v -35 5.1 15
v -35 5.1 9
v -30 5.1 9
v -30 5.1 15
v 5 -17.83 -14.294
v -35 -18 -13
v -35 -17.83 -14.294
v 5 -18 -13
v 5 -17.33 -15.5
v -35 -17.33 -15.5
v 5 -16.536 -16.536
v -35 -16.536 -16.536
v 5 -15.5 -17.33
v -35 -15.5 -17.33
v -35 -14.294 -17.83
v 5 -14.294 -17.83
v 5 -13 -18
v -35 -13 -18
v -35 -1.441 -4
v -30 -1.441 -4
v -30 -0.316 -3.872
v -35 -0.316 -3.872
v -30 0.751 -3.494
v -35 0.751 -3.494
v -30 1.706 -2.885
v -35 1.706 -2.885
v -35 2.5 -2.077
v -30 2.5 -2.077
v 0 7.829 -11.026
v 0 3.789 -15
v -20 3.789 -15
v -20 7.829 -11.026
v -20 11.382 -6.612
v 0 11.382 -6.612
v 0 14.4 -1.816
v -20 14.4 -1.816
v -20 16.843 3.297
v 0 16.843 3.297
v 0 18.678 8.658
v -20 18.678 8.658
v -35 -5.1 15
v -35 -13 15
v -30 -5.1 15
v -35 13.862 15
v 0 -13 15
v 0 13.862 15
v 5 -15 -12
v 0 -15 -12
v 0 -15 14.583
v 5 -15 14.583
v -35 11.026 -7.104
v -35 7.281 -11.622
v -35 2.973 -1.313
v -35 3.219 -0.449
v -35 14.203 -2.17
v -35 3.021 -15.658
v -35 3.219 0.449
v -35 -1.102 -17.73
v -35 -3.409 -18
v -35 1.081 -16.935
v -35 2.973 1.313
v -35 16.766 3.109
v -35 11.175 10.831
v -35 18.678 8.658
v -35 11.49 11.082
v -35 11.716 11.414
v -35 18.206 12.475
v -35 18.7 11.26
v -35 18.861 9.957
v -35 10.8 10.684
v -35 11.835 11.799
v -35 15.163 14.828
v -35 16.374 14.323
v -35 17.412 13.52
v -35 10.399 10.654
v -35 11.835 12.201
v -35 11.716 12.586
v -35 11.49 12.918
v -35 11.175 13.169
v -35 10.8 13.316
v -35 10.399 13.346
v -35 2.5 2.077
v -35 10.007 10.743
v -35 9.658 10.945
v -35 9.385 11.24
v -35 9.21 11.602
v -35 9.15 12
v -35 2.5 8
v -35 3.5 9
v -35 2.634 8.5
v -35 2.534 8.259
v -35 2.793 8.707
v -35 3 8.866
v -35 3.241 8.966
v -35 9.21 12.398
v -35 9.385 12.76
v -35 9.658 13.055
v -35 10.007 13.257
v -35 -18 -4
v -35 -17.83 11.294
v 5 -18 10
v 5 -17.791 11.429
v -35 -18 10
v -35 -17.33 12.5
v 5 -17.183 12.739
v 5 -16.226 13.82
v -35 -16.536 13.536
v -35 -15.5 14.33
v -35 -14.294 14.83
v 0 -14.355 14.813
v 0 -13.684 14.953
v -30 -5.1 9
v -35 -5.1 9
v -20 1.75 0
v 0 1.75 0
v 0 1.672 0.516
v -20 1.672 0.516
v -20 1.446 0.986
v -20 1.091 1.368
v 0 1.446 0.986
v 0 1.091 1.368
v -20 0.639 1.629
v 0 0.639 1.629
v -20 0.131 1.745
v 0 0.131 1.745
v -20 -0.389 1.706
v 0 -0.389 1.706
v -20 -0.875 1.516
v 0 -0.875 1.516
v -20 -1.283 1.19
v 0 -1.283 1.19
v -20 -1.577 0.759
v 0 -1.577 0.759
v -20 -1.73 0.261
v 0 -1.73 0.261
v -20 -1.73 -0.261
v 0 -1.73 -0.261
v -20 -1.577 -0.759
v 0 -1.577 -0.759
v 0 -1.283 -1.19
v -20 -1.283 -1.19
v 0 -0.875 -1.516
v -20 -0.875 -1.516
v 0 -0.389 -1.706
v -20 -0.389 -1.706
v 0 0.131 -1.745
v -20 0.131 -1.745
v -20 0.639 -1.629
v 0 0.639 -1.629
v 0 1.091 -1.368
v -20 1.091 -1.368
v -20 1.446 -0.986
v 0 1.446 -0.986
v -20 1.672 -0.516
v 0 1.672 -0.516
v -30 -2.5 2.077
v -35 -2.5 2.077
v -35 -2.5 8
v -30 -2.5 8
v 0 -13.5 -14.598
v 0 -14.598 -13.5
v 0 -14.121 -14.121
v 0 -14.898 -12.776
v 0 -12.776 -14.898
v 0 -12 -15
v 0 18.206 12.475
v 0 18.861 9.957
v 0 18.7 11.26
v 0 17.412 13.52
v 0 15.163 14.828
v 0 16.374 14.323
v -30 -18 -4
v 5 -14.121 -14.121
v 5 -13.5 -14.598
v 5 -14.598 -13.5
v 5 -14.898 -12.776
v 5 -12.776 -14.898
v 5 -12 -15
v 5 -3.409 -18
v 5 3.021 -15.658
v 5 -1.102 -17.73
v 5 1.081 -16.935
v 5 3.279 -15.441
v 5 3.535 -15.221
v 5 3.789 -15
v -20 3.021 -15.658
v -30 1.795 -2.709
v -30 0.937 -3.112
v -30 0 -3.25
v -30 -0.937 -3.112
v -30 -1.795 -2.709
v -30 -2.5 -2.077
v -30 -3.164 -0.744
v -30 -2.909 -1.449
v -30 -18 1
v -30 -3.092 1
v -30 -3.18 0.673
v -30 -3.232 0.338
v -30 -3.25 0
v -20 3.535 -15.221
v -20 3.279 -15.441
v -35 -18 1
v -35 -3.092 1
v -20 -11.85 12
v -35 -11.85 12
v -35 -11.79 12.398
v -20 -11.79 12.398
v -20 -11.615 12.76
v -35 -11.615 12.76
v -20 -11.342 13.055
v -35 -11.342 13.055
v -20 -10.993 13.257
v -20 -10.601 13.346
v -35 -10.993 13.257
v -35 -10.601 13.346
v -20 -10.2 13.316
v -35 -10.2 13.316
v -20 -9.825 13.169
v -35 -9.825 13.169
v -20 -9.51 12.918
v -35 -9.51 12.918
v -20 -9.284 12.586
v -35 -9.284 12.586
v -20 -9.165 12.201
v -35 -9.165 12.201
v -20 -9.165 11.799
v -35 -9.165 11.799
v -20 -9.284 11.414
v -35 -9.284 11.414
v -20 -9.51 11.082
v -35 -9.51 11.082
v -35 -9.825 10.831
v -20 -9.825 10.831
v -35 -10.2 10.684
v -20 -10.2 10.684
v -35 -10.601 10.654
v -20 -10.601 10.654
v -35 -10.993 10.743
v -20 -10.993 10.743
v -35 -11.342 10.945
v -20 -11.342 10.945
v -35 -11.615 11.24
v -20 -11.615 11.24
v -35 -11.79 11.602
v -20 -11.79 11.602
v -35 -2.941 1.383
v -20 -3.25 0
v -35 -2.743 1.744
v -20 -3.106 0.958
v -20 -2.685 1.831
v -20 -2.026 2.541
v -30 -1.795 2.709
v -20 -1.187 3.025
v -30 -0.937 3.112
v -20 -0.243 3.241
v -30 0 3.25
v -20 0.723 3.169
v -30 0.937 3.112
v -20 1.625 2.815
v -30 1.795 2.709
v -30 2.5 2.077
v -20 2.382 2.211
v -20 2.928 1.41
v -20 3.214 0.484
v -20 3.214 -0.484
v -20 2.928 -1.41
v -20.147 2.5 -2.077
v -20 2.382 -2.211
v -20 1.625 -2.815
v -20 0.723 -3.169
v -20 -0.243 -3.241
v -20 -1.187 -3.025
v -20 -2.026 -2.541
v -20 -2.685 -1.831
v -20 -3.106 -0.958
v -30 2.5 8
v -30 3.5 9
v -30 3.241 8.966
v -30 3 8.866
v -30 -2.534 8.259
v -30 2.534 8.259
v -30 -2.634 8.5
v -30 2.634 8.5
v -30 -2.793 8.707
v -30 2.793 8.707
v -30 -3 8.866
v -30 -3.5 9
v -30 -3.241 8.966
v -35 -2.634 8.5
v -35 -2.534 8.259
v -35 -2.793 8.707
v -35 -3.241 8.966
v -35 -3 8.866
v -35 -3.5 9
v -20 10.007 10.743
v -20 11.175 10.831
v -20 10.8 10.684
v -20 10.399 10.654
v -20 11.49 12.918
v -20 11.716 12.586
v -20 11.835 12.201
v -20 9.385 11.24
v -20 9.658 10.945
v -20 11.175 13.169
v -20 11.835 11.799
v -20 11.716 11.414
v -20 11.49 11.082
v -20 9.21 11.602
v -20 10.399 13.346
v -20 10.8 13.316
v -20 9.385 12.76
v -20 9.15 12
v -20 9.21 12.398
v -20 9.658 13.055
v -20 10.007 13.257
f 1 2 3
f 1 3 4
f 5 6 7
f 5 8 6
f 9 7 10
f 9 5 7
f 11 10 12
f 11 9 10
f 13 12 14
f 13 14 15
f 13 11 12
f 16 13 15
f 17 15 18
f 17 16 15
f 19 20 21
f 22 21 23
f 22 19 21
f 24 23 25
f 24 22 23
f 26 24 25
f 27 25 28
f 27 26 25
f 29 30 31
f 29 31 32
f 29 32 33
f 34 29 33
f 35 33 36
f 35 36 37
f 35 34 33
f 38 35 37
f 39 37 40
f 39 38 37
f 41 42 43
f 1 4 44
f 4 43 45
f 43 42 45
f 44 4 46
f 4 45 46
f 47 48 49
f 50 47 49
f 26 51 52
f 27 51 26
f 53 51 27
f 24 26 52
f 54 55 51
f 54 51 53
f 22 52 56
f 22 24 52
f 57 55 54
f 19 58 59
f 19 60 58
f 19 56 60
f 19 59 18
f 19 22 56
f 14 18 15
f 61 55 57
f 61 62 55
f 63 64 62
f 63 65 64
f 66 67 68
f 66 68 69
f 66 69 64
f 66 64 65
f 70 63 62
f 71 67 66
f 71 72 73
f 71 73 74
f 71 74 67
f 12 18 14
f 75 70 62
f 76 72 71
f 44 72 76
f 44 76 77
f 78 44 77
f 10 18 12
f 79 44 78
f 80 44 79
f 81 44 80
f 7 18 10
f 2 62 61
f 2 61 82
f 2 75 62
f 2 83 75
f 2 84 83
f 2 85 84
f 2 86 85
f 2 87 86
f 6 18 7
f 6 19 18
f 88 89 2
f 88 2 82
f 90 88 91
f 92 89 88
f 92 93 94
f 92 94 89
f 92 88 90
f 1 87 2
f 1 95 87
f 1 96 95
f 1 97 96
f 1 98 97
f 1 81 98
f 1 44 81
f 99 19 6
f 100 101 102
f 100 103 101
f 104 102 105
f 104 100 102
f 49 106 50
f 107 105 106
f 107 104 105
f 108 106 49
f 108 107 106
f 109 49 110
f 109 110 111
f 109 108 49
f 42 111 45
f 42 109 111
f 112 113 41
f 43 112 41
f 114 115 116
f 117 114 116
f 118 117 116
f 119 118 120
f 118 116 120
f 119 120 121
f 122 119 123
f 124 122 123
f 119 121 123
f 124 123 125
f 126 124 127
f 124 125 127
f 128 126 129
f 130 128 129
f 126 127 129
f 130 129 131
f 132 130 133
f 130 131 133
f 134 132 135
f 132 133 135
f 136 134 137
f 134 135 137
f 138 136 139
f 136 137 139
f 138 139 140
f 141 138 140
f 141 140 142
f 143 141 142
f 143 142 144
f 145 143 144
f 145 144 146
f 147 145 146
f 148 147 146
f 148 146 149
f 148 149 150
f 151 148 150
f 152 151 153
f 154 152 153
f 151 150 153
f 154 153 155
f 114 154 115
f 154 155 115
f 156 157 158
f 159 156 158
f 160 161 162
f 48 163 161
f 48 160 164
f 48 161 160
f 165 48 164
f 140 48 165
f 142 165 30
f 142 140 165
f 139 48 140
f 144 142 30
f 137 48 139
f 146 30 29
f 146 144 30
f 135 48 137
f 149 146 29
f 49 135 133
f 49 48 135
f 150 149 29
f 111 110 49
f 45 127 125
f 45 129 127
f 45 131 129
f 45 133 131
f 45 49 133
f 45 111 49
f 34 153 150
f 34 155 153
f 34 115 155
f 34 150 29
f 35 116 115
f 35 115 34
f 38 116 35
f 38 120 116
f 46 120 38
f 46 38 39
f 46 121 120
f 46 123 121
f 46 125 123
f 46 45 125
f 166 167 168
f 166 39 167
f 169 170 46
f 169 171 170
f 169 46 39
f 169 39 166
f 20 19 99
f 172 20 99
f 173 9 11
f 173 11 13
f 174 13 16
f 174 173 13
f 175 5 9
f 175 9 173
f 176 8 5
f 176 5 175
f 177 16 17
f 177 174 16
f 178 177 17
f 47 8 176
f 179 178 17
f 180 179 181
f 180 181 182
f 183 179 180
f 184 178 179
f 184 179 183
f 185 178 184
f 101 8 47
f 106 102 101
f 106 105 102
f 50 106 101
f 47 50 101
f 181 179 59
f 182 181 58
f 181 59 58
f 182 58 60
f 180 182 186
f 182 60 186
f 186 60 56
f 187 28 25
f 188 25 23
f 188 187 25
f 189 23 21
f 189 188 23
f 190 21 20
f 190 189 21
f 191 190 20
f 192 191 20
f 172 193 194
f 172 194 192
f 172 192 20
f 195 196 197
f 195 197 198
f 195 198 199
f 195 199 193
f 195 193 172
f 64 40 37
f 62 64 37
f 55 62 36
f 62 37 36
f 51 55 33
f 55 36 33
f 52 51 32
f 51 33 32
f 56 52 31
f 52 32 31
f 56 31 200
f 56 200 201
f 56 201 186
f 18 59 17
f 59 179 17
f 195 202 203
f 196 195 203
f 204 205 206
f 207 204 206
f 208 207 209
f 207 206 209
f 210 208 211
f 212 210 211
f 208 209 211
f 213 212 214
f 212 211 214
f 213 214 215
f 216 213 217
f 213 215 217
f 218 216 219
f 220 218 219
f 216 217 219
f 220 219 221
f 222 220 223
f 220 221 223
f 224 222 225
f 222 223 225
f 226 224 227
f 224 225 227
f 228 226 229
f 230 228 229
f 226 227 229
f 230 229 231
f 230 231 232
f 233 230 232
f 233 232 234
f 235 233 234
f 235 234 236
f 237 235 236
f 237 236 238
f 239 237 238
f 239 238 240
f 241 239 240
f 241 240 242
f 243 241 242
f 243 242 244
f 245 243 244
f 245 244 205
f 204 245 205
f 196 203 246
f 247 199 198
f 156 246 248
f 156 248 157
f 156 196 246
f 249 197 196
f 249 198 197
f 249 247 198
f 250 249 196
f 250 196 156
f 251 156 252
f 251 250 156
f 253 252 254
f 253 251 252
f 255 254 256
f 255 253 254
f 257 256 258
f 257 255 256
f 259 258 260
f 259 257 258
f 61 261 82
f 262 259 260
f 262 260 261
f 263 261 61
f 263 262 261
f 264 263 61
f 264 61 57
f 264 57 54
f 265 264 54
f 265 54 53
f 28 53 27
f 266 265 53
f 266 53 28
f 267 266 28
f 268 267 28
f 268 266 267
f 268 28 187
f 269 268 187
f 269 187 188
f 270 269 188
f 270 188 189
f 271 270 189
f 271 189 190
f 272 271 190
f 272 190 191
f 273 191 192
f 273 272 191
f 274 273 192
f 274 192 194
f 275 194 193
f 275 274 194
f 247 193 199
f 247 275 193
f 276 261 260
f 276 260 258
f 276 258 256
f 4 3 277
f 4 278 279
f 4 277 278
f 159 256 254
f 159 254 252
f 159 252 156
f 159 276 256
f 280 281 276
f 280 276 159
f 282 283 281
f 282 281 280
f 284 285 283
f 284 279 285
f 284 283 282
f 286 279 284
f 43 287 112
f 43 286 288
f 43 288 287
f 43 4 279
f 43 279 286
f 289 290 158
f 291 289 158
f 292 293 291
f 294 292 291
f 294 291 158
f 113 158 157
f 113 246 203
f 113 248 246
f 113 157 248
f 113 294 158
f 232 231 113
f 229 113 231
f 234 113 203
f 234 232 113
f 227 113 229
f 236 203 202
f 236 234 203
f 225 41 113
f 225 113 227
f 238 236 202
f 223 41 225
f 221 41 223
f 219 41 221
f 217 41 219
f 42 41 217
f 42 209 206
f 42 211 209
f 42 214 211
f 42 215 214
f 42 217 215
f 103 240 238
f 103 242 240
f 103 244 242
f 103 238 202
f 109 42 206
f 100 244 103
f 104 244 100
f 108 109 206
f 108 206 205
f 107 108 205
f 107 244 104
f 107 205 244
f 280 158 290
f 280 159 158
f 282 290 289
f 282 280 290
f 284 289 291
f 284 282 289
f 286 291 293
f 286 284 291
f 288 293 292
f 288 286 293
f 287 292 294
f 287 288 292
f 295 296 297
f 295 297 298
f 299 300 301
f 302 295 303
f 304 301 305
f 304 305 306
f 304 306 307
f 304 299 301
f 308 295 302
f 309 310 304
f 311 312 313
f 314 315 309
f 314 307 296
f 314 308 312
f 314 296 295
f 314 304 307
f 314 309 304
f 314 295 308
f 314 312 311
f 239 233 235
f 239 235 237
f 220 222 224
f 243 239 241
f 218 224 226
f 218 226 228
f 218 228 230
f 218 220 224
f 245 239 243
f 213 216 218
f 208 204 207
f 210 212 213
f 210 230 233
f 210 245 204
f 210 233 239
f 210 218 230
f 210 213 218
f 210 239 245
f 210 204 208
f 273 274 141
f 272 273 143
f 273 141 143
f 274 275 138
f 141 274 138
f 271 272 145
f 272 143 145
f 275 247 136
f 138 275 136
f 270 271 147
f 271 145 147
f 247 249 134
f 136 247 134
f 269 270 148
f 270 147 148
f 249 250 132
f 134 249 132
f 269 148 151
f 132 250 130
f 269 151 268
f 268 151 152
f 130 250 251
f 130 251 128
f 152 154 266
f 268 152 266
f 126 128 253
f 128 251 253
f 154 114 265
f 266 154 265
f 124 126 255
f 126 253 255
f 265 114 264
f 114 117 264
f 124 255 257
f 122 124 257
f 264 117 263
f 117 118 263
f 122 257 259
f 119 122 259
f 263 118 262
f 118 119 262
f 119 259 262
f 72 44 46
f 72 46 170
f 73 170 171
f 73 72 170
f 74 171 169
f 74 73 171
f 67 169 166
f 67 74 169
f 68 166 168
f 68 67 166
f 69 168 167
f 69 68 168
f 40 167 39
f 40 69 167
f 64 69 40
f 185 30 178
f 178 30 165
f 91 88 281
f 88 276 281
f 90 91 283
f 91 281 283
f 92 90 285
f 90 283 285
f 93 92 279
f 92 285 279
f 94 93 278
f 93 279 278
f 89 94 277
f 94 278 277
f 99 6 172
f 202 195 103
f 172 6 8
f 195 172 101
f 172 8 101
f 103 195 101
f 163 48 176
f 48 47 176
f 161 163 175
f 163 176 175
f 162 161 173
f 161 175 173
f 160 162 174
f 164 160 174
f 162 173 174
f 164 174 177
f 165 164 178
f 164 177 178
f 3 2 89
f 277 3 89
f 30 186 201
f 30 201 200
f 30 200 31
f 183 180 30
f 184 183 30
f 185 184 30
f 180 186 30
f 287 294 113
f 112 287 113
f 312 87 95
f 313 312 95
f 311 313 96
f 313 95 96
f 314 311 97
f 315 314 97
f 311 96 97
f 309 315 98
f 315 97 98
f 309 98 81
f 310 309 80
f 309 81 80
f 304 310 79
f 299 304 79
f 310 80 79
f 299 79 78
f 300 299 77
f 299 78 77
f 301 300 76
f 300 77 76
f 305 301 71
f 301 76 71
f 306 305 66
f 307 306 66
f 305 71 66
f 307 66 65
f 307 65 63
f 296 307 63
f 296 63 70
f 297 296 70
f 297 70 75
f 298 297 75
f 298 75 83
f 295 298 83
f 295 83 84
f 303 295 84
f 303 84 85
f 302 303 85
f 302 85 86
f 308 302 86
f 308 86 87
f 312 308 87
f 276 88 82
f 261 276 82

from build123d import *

# Parameters (mm, degrees)
F1_DEPTH     = 5
F0_R         = 1.75
F2_DEPTH     = 20
F3_R         = 3.25
F4_DEPTH     = 15
F5_R         = 1.35
F5_W         = 2.6
F5_H         = 6
F5_W_2       = 5
F6_DEPTH     = 5
F7_DEPTH     = 10
F8_R         = 3
F9_R         = 5
F10_T1_DEPTH = 14.8533585862
F11_R        = 1
F12_R        = 5
F13_R        = 5
F14_R        = 10


# Not quite as in the source:
# - a fillet or chamfer that OpenCascade refuses, or shapes differently, is made with other operations: its cross-section is extruded or revolved along the edge and cut away or added


with BuildPart() as f1:
    # F0 (on Right) → F1 (new body)
    with BuildSketch(Plane.YZ):
        Polygon((-15, -15), (-15, 0), (-15, 15), (-18, 15), (-18, 0), (-18, -18), (0, -18), (0, -15), align=None)
        with BuildLine():
            Line((3.7889535467, -15), (0, -15))
            Line((0, -15), (0, -18))
            ThreePointArc((0, -18), (1.9315685392, -16.546846326), (3.7889535467, -15))
        make_face()
    extrude(amount=F1_DEPTH)

    # F0 (on Right) → F2 (join)
    with BuildSketch(Plane.YZ):
        with BuildLine():
            Line((-15, 15), (-15, 0))
            Line((-15, 0), (-15, -15))
            Line((-15, -15), (0, -15))
            Line((0, -15), (3.7889535467, -15))
            ThreePointArc((3.7889535467, -15), (14.5947925758, -1.4591648304), (20, 15))
            Line((20, 15), (-15, 15))
        make_face()
        Circle(F0_R, mode=Mode.SUBTRACT)
        Polygon((-15, -15), (-15, 0), (-15, 15), (-18, 15), (-18, 0), (-18, -18), (0, -18), (0, -15), align=None)
        with BuildLine():
            Line((3.7889535467, -15), (0, -15))
            Line((0, -15), (0, -18))
            ThreePointArc((0, -18), (1.9315685392, -16.546846326), (3.7889535467, -15))
        make_face()
    extrude(amount=-F2_DEPTH)

    # F3 (on face) → F4 (join)
    with BuildSketch(Plane(origin=(-20, 0, 0), x_dir=(0, -1, 0), z_dir=(-1, 0, 0))):
        with BuildLine():
            Line((18, -18), (18, 15))
            Line((18, 15), (-20, 15))
            ThreePointArc((-20, 15), (-13.3934629181, -3.5566441928), (0, -18))
            Line((0, -18), (18, -18))
        make_face()
        Circle(F3_R, mode=Mode.SUBTRACT)
    extrude(amount=F4_DEPTH)

    # F5 (on face) → F6 (cut)
    with BuildSketch(Plane(origin=(-35, 0, 0), x_dir=(0, -1, 0), z_dir=(-1, 0, 0))):
        with Locations((-10.5, 12)):
            Circle(F5_R)
        with Locations((10.5, 12)):
            Circle(F5_R)
        with Locations((3.8, 12)):
            Rectangle(F5_W, F5_H)
        with BuildLine():
            Line((2.5, 2.0766559657), (2.5, 9))
            Line((2.5, 9), (-2.5, 9))
            Line((-2.5, 9), (-2.5, 2.0766559657))
            ThreePointArc((-2.5, 2.0766559657), (0, 3.25), (2.5, 2.0766559657))
        make_face()
        with Locations((0, 12)):
            Rectangle(F5_W_2, F5_H)
        with Locations((-3.8, 12)):
            Rectangle(F5_W, F5_H)
        with BuildLine():
            Line((18, 1), (3.0923292192, 1))
            ThreePointArc((3.0923292192, 1), (3.2103403217, 0.5061768651), (3.25, 0))
            ThreePointArc((3.25, 0), (3.0567548152, -1.1039701083), (2.5, -2.0766559657))
            Line((2.5, -2.0766559657), (2.5, -4))
            Line((2.5, -4), (18, -4))
            Line((18, -4), (18, 1))
        make_face()
        with BuildLine():
            ThreePointArc((2.5, -2.0766559657), (0, -3.25), (-2.5, -2.0766559657))
            Line((-2.5, -2.0766559657), (-2.5, -4))
            Line((-2.5, -4), (0, -4))
            Line((0, -4), (2.5, -4))
            Line((2.5, -4), (2.5, -2.0766559657))
        make_face()
    extrude(amount=-F6_DEPTH, mode=Mode.SUBTRACT)

    # F7 (cut): faces of the model
    f7_faces = [f1.faces().sort_by_distance(p)[0] for p in [
        (-30, 10.5, 12),
        (-30, -10.5, 12),
    ]]
    extrude(f7_faces, amount=-F7_DEPTH, mode=Mode.SUBTRACT)

    # F8
    f8_edges = [f1.edges().sort_by_distance(p)[0] for p in [
        (2.5, -15, -15),
    ]]
    fillet(f8_edges, radius=F8_R)

    # F9
    f9_edges = [f1.edges().sort_by_distance(p)[0] for p in [
        (-15, -18, -18),
    ]]
    fillet(f9_edges, radius=F9_R)

    # F10: fillet of radius 5 on 1 edges, made by hand

    # F10_s2 → F10_t1 (join)
    with BuildSketch(Plane.YZ.offset(-35)):
        with BuildLine():
            ThreePointArc((-1.4413434345, -4), (0.7514538853, -3.4935108673), (2.5, -2.0766559657))
            Line((2.5, -2.0766559657), (2.5, -4))
            Line((2.5, -4), (-1.4413434345, -4))
        make_face()
    extrude(amount=F10_T1_DEPTH)

    # F11
    f11_edges = [f1.edges().sort_by_distance(p)[0] for p in [
        (-32.5, 2.5, 9),
        (-32.5, -2.5, 9),
    ]]
    fillet(f11_edges, radius=F11_R)

    # F12
    f12_edges = [f1.edges().sort_by_distance(p)[0] for p in [
        (-17.5, 20, 15),
    ]]
    fillet(f12_edges, radius=F12_R)

    # F13
    f13_edges = [f1.edges().sort_by_distance(p)[0] for p in [
        (-15, -18, 15),
    ]]
    fillet(f13_edges, radius=F13_R)

    # F14
    f14_edges = [f1.edges().sort_by_distance(p)[0] for p in [
        (-15, 0, -18),
    ]]
    fillet(f14_edges, radius=F14_R)


solid = f1.part
